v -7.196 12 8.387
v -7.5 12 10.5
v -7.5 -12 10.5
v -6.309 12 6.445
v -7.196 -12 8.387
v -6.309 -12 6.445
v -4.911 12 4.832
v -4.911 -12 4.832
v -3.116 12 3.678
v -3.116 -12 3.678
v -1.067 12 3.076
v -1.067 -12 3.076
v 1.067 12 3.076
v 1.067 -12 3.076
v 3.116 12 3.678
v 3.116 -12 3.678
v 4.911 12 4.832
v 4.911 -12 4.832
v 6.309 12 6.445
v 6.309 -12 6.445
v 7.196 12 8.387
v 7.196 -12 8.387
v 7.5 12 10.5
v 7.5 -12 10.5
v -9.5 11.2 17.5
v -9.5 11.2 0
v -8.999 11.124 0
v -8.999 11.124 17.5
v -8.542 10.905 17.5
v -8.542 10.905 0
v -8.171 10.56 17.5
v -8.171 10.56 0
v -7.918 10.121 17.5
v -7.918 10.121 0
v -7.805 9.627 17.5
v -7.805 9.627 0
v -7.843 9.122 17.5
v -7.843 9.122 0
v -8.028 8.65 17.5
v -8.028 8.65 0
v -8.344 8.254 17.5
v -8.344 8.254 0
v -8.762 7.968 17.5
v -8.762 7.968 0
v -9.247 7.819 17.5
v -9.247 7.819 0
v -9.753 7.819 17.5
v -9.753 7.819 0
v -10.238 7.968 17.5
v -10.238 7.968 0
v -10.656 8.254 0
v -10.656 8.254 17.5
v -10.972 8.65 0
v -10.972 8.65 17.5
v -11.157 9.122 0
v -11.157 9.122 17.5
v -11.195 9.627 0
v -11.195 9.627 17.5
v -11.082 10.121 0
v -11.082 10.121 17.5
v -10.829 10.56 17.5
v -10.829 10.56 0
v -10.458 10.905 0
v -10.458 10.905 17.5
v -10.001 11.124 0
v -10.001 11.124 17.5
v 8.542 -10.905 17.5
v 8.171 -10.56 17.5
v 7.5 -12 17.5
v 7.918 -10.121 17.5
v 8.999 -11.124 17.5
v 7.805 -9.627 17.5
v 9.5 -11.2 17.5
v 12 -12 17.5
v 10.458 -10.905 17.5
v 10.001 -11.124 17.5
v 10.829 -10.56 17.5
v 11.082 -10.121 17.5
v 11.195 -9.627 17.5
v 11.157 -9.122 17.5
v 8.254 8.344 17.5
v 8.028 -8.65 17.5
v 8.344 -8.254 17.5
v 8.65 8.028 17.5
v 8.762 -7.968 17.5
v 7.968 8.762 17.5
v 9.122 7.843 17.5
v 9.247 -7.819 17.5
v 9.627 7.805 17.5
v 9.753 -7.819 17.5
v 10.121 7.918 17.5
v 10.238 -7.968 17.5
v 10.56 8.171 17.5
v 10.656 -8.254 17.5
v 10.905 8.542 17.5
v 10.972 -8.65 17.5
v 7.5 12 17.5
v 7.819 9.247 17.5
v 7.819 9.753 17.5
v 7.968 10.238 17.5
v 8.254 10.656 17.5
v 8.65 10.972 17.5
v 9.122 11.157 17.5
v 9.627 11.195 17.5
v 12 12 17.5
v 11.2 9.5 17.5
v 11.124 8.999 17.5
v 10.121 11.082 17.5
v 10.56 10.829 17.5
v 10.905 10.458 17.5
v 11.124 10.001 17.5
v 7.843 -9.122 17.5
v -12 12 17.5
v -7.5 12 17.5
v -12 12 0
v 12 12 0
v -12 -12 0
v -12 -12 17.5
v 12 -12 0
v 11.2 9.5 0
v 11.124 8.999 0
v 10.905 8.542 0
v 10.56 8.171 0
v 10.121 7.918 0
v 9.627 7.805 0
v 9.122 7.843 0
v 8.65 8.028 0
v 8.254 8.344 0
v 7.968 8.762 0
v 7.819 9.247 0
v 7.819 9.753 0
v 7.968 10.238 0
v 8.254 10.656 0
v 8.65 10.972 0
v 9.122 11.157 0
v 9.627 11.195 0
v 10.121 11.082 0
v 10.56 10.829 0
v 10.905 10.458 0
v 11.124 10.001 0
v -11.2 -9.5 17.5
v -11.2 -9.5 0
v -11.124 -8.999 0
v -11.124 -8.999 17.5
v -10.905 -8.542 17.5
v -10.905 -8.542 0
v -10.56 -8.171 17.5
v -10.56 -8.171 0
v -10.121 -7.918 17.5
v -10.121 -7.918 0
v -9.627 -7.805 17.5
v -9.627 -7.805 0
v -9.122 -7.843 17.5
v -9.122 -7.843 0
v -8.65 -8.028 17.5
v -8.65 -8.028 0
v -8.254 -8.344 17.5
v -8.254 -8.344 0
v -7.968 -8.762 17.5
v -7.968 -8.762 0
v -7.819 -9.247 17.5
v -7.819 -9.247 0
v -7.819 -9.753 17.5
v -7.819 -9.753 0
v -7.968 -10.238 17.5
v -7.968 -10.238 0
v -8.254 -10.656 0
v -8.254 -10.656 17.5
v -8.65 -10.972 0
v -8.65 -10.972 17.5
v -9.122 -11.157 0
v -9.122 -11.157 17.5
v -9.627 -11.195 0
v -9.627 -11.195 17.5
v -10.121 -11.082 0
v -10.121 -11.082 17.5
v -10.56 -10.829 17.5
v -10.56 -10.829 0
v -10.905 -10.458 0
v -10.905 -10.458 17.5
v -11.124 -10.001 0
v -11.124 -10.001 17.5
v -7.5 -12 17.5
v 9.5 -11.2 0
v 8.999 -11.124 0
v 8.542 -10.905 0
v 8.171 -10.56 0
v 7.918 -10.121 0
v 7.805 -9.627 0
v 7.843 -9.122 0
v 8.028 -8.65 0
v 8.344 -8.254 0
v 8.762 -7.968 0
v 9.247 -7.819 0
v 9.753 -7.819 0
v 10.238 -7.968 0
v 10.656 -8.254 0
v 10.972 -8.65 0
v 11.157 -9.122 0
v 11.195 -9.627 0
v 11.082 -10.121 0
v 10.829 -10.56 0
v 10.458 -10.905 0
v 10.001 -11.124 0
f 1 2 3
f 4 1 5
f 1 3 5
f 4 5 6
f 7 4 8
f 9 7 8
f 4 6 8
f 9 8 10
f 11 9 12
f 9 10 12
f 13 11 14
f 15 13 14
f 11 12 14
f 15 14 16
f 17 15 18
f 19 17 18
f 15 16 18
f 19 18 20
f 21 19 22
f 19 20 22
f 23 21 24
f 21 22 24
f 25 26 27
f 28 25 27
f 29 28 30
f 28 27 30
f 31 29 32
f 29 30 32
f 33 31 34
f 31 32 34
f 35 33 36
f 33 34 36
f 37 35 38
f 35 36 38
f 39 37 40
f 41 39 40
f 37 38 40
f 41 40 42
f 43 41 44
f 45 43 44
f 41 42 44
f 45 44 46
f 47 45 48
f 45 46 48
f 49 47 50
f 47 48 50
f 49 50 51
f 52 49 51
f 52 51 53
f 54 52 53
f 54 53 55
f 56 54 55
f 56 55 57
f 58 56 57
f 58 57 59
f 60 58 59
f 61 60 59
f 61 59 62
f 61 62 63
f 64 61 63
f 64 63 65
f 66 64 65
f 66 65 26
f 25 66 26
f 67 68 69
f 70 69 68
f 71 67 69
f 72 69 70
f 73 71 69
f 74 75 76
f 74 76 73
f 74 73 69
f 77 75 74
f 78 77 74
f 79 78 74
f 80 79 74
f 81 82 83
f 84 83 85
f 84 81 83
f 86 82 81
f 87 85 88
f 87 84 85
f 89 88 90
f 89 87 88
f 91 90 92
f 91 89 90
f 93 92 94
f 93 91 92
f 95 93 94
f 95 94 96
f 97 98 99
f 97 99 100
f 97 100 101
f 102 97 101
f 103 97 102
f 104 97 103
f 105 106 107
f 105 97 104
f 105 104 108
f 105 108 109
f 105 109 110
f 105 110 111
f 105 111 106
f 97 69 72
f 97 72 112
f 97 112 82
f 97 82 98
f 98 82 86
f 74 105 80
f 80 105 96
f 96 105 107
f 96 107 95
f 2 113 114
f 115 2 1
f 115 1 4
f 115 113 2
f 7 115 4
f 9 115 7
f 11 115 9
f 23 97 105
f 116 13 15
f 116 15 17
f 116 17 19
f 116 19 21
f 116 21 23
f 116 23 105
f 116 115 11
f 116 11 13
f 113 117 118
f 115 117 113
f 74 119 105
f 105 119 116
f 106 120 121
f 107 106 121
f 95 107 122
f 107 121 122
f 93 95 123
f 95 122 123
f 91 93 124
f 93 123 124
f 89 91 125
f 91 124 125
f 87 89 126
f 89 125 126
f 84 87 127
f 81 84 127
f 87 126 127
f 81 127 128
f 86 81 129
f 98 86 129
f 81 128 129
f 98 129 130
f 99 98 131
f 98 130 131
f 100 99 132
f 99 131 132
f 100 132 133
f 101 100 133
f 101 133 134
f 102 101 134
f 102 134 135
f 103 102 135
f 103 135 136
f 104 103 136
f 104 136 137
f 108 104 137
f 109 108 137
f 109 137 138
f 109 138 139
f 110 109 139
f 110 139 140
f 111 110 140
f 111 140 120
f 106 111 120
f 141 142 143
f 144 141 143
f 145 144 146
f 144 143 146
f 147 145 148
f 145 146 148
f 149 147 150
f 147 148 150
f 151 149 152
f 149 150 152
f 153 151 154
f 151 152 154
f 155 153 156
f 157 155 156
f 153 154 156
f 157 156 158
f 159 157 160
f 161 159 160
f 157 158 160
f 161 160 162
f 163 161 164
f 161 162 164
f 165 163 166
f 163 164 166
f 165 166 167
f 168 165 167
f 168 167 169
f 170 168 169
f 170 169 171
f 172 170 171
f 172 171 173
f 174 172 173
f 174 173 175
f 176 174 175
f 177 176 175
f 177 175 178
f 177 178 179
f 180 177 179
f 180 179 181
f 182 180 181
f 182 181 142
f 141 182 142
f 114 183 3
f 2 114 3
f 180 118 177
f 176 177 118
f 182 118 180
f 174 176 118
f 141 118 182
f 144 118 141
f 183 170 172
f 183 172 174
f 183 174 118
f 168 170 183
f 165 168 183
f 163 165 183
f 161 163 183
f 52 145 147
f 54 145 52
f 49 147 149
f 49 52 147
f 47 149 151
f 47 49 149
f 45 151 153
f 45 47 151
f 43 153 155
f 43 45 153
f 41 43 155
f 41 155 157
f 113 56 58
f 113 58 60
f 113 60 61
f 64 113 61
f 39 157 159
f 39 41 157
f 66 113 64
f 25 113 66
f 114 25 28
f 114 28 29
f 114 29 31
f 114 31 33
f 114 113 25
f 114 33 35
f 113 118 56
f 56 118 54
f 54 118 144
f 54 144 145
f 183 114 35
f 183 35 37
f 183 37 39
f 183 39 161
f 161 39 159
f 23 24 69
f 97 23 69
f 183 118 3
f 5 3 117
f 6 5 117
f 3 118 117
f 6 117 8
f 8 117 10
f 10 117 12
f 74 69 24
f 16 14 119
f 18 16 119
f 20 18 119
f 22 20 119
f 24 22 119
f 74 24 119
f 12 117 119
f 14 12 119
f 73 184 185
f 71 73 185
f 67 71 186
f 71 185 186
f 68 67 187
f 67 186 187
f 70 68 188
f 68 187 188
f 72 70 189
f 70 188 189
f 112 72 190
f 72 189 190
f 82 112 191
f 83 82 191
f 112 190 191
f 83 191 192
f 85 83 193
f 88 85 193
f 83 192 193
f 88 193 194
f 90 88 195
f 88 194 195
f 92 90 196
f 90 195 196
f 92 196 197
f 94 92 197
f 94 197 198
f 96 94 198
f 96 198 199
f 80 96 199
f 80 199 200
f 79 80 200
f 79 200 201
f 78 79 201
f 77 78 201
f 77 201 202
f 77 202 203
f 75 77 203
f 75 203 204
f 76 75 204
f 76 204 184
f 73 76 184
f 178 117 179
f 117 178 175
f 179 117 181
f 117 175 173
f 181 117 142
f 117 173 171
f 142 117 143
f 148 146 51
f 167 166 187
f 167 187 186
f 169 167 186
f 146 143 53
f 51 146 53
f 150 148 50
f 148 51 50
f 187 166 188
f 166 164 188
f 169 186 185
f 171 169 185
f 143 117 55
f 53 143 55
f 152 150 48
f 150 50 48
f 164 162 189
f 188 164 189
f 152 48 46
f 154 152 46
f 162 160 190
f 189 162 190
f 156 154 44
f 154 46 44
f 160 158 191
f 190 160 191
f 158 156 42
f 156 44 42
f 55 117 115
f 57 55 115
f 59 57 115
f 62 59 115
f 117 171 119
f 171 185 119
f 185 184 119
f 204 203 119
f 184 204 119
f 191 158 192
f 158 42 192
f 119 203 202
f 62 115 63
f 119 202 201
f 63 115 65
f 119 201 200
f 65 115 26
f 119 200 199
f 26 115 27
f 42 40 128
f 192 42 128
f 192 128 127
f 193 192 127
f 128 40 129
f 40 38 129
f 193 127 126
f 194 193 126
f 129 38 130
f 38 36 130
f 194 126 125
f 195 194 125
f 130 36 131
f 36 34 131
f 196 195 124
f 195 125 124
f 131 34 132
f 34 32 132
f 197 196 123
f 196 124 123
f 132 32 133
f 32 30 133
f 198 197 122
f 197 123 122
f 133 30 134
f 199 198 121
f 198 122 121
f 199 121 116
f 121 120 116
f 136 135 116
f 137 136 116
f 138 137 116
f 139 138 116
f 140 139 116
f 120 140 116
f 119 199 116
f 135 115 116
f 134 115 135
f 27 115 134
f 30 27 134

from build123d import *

# Parameters (mm, degrees)
F0_W            = 24
F0_H            = 24
F1_DEPTH        = 17.5
F3_DEPTH        = 25
F5_D            = 3.4
F5_COPIES_COUNT = 4


# Not quite as in the source:
# - a pattern or mirror of a feature is missing from the dataset's text; its kind, count and spacing are read off the source's solid


with BuildPart() as f1:
    # F0 (on Top) → F1 (new body)
    with BuildSketch(Plane.XY):
        Rectangle(F0_W, F0_H)
    extrude(amount=F1_DEPTH)

    # F2 (on face) → F3 (cut)
    with BuildSketch(Plane.XZ.offset(12)):
        with BuildLine():
            ThreePointArc((-7.5, 10.5), (0, 3), (7.5, 10.5))
            Line((7.5, 10.5), (-7.5, 10.5))
        make_face()
        with BuildLine():
            ThreePointArc((7.5, 10.5), (6.1824092402, 14.7459175671), (2.6925824036, 17.5))
            Line((2.6925824036, 17.5), (-2.6925824036, 17.5))
            ThreePointArc((-2.6925824036, 17.5), (-6.1824092402, 14.7459175671), (-7.5, 10.5))
            Line((-7.5, 10.5), (7.5, 10.5))
        make_face()
        with BuildLine():
            Line((7.5, 10.5), (7.5, 17.5))
            Line((7.5, 17.5), (2.6925824036, 17.5))
            ThreePointArc((2.6925824036, 17.5), (6.1824092402, 14.7459175671), (7.5, 10.5))
        make_face()
        with BuildLine():
            ThreePointArc((-7.5, 10.5), (-6.1824092402, 14.7459175671), (-2.6925824036, 17.5))
            Line((-2.6925824036, 17.5), (-7.5, 17.5))
            Line((-7.5, 17.5), (-7.5, 10.5))
        make_face()
    extrude(amount=-F3_DEPTH, mode=Mode.SUBTRACT)

    # F5 (through all)
    with Locations(Plane.XY.offset(17.5)):
        with Locations((-9.5, -9.5)):
            f5 = Hole(F5_D / 2)

    # F5_copies: F5 ×4 about axis
    f5_copies_axis = Axis((0, 0, 0), (0, 0, 1))
    for i in range(1, F5_COPIES_COUNT):
        add(f5.rotate(f5_copies_axis, i * 360 / F5_COPIES_COUNT), mode=Mode.SUBTRACT)


solid = f1.part
